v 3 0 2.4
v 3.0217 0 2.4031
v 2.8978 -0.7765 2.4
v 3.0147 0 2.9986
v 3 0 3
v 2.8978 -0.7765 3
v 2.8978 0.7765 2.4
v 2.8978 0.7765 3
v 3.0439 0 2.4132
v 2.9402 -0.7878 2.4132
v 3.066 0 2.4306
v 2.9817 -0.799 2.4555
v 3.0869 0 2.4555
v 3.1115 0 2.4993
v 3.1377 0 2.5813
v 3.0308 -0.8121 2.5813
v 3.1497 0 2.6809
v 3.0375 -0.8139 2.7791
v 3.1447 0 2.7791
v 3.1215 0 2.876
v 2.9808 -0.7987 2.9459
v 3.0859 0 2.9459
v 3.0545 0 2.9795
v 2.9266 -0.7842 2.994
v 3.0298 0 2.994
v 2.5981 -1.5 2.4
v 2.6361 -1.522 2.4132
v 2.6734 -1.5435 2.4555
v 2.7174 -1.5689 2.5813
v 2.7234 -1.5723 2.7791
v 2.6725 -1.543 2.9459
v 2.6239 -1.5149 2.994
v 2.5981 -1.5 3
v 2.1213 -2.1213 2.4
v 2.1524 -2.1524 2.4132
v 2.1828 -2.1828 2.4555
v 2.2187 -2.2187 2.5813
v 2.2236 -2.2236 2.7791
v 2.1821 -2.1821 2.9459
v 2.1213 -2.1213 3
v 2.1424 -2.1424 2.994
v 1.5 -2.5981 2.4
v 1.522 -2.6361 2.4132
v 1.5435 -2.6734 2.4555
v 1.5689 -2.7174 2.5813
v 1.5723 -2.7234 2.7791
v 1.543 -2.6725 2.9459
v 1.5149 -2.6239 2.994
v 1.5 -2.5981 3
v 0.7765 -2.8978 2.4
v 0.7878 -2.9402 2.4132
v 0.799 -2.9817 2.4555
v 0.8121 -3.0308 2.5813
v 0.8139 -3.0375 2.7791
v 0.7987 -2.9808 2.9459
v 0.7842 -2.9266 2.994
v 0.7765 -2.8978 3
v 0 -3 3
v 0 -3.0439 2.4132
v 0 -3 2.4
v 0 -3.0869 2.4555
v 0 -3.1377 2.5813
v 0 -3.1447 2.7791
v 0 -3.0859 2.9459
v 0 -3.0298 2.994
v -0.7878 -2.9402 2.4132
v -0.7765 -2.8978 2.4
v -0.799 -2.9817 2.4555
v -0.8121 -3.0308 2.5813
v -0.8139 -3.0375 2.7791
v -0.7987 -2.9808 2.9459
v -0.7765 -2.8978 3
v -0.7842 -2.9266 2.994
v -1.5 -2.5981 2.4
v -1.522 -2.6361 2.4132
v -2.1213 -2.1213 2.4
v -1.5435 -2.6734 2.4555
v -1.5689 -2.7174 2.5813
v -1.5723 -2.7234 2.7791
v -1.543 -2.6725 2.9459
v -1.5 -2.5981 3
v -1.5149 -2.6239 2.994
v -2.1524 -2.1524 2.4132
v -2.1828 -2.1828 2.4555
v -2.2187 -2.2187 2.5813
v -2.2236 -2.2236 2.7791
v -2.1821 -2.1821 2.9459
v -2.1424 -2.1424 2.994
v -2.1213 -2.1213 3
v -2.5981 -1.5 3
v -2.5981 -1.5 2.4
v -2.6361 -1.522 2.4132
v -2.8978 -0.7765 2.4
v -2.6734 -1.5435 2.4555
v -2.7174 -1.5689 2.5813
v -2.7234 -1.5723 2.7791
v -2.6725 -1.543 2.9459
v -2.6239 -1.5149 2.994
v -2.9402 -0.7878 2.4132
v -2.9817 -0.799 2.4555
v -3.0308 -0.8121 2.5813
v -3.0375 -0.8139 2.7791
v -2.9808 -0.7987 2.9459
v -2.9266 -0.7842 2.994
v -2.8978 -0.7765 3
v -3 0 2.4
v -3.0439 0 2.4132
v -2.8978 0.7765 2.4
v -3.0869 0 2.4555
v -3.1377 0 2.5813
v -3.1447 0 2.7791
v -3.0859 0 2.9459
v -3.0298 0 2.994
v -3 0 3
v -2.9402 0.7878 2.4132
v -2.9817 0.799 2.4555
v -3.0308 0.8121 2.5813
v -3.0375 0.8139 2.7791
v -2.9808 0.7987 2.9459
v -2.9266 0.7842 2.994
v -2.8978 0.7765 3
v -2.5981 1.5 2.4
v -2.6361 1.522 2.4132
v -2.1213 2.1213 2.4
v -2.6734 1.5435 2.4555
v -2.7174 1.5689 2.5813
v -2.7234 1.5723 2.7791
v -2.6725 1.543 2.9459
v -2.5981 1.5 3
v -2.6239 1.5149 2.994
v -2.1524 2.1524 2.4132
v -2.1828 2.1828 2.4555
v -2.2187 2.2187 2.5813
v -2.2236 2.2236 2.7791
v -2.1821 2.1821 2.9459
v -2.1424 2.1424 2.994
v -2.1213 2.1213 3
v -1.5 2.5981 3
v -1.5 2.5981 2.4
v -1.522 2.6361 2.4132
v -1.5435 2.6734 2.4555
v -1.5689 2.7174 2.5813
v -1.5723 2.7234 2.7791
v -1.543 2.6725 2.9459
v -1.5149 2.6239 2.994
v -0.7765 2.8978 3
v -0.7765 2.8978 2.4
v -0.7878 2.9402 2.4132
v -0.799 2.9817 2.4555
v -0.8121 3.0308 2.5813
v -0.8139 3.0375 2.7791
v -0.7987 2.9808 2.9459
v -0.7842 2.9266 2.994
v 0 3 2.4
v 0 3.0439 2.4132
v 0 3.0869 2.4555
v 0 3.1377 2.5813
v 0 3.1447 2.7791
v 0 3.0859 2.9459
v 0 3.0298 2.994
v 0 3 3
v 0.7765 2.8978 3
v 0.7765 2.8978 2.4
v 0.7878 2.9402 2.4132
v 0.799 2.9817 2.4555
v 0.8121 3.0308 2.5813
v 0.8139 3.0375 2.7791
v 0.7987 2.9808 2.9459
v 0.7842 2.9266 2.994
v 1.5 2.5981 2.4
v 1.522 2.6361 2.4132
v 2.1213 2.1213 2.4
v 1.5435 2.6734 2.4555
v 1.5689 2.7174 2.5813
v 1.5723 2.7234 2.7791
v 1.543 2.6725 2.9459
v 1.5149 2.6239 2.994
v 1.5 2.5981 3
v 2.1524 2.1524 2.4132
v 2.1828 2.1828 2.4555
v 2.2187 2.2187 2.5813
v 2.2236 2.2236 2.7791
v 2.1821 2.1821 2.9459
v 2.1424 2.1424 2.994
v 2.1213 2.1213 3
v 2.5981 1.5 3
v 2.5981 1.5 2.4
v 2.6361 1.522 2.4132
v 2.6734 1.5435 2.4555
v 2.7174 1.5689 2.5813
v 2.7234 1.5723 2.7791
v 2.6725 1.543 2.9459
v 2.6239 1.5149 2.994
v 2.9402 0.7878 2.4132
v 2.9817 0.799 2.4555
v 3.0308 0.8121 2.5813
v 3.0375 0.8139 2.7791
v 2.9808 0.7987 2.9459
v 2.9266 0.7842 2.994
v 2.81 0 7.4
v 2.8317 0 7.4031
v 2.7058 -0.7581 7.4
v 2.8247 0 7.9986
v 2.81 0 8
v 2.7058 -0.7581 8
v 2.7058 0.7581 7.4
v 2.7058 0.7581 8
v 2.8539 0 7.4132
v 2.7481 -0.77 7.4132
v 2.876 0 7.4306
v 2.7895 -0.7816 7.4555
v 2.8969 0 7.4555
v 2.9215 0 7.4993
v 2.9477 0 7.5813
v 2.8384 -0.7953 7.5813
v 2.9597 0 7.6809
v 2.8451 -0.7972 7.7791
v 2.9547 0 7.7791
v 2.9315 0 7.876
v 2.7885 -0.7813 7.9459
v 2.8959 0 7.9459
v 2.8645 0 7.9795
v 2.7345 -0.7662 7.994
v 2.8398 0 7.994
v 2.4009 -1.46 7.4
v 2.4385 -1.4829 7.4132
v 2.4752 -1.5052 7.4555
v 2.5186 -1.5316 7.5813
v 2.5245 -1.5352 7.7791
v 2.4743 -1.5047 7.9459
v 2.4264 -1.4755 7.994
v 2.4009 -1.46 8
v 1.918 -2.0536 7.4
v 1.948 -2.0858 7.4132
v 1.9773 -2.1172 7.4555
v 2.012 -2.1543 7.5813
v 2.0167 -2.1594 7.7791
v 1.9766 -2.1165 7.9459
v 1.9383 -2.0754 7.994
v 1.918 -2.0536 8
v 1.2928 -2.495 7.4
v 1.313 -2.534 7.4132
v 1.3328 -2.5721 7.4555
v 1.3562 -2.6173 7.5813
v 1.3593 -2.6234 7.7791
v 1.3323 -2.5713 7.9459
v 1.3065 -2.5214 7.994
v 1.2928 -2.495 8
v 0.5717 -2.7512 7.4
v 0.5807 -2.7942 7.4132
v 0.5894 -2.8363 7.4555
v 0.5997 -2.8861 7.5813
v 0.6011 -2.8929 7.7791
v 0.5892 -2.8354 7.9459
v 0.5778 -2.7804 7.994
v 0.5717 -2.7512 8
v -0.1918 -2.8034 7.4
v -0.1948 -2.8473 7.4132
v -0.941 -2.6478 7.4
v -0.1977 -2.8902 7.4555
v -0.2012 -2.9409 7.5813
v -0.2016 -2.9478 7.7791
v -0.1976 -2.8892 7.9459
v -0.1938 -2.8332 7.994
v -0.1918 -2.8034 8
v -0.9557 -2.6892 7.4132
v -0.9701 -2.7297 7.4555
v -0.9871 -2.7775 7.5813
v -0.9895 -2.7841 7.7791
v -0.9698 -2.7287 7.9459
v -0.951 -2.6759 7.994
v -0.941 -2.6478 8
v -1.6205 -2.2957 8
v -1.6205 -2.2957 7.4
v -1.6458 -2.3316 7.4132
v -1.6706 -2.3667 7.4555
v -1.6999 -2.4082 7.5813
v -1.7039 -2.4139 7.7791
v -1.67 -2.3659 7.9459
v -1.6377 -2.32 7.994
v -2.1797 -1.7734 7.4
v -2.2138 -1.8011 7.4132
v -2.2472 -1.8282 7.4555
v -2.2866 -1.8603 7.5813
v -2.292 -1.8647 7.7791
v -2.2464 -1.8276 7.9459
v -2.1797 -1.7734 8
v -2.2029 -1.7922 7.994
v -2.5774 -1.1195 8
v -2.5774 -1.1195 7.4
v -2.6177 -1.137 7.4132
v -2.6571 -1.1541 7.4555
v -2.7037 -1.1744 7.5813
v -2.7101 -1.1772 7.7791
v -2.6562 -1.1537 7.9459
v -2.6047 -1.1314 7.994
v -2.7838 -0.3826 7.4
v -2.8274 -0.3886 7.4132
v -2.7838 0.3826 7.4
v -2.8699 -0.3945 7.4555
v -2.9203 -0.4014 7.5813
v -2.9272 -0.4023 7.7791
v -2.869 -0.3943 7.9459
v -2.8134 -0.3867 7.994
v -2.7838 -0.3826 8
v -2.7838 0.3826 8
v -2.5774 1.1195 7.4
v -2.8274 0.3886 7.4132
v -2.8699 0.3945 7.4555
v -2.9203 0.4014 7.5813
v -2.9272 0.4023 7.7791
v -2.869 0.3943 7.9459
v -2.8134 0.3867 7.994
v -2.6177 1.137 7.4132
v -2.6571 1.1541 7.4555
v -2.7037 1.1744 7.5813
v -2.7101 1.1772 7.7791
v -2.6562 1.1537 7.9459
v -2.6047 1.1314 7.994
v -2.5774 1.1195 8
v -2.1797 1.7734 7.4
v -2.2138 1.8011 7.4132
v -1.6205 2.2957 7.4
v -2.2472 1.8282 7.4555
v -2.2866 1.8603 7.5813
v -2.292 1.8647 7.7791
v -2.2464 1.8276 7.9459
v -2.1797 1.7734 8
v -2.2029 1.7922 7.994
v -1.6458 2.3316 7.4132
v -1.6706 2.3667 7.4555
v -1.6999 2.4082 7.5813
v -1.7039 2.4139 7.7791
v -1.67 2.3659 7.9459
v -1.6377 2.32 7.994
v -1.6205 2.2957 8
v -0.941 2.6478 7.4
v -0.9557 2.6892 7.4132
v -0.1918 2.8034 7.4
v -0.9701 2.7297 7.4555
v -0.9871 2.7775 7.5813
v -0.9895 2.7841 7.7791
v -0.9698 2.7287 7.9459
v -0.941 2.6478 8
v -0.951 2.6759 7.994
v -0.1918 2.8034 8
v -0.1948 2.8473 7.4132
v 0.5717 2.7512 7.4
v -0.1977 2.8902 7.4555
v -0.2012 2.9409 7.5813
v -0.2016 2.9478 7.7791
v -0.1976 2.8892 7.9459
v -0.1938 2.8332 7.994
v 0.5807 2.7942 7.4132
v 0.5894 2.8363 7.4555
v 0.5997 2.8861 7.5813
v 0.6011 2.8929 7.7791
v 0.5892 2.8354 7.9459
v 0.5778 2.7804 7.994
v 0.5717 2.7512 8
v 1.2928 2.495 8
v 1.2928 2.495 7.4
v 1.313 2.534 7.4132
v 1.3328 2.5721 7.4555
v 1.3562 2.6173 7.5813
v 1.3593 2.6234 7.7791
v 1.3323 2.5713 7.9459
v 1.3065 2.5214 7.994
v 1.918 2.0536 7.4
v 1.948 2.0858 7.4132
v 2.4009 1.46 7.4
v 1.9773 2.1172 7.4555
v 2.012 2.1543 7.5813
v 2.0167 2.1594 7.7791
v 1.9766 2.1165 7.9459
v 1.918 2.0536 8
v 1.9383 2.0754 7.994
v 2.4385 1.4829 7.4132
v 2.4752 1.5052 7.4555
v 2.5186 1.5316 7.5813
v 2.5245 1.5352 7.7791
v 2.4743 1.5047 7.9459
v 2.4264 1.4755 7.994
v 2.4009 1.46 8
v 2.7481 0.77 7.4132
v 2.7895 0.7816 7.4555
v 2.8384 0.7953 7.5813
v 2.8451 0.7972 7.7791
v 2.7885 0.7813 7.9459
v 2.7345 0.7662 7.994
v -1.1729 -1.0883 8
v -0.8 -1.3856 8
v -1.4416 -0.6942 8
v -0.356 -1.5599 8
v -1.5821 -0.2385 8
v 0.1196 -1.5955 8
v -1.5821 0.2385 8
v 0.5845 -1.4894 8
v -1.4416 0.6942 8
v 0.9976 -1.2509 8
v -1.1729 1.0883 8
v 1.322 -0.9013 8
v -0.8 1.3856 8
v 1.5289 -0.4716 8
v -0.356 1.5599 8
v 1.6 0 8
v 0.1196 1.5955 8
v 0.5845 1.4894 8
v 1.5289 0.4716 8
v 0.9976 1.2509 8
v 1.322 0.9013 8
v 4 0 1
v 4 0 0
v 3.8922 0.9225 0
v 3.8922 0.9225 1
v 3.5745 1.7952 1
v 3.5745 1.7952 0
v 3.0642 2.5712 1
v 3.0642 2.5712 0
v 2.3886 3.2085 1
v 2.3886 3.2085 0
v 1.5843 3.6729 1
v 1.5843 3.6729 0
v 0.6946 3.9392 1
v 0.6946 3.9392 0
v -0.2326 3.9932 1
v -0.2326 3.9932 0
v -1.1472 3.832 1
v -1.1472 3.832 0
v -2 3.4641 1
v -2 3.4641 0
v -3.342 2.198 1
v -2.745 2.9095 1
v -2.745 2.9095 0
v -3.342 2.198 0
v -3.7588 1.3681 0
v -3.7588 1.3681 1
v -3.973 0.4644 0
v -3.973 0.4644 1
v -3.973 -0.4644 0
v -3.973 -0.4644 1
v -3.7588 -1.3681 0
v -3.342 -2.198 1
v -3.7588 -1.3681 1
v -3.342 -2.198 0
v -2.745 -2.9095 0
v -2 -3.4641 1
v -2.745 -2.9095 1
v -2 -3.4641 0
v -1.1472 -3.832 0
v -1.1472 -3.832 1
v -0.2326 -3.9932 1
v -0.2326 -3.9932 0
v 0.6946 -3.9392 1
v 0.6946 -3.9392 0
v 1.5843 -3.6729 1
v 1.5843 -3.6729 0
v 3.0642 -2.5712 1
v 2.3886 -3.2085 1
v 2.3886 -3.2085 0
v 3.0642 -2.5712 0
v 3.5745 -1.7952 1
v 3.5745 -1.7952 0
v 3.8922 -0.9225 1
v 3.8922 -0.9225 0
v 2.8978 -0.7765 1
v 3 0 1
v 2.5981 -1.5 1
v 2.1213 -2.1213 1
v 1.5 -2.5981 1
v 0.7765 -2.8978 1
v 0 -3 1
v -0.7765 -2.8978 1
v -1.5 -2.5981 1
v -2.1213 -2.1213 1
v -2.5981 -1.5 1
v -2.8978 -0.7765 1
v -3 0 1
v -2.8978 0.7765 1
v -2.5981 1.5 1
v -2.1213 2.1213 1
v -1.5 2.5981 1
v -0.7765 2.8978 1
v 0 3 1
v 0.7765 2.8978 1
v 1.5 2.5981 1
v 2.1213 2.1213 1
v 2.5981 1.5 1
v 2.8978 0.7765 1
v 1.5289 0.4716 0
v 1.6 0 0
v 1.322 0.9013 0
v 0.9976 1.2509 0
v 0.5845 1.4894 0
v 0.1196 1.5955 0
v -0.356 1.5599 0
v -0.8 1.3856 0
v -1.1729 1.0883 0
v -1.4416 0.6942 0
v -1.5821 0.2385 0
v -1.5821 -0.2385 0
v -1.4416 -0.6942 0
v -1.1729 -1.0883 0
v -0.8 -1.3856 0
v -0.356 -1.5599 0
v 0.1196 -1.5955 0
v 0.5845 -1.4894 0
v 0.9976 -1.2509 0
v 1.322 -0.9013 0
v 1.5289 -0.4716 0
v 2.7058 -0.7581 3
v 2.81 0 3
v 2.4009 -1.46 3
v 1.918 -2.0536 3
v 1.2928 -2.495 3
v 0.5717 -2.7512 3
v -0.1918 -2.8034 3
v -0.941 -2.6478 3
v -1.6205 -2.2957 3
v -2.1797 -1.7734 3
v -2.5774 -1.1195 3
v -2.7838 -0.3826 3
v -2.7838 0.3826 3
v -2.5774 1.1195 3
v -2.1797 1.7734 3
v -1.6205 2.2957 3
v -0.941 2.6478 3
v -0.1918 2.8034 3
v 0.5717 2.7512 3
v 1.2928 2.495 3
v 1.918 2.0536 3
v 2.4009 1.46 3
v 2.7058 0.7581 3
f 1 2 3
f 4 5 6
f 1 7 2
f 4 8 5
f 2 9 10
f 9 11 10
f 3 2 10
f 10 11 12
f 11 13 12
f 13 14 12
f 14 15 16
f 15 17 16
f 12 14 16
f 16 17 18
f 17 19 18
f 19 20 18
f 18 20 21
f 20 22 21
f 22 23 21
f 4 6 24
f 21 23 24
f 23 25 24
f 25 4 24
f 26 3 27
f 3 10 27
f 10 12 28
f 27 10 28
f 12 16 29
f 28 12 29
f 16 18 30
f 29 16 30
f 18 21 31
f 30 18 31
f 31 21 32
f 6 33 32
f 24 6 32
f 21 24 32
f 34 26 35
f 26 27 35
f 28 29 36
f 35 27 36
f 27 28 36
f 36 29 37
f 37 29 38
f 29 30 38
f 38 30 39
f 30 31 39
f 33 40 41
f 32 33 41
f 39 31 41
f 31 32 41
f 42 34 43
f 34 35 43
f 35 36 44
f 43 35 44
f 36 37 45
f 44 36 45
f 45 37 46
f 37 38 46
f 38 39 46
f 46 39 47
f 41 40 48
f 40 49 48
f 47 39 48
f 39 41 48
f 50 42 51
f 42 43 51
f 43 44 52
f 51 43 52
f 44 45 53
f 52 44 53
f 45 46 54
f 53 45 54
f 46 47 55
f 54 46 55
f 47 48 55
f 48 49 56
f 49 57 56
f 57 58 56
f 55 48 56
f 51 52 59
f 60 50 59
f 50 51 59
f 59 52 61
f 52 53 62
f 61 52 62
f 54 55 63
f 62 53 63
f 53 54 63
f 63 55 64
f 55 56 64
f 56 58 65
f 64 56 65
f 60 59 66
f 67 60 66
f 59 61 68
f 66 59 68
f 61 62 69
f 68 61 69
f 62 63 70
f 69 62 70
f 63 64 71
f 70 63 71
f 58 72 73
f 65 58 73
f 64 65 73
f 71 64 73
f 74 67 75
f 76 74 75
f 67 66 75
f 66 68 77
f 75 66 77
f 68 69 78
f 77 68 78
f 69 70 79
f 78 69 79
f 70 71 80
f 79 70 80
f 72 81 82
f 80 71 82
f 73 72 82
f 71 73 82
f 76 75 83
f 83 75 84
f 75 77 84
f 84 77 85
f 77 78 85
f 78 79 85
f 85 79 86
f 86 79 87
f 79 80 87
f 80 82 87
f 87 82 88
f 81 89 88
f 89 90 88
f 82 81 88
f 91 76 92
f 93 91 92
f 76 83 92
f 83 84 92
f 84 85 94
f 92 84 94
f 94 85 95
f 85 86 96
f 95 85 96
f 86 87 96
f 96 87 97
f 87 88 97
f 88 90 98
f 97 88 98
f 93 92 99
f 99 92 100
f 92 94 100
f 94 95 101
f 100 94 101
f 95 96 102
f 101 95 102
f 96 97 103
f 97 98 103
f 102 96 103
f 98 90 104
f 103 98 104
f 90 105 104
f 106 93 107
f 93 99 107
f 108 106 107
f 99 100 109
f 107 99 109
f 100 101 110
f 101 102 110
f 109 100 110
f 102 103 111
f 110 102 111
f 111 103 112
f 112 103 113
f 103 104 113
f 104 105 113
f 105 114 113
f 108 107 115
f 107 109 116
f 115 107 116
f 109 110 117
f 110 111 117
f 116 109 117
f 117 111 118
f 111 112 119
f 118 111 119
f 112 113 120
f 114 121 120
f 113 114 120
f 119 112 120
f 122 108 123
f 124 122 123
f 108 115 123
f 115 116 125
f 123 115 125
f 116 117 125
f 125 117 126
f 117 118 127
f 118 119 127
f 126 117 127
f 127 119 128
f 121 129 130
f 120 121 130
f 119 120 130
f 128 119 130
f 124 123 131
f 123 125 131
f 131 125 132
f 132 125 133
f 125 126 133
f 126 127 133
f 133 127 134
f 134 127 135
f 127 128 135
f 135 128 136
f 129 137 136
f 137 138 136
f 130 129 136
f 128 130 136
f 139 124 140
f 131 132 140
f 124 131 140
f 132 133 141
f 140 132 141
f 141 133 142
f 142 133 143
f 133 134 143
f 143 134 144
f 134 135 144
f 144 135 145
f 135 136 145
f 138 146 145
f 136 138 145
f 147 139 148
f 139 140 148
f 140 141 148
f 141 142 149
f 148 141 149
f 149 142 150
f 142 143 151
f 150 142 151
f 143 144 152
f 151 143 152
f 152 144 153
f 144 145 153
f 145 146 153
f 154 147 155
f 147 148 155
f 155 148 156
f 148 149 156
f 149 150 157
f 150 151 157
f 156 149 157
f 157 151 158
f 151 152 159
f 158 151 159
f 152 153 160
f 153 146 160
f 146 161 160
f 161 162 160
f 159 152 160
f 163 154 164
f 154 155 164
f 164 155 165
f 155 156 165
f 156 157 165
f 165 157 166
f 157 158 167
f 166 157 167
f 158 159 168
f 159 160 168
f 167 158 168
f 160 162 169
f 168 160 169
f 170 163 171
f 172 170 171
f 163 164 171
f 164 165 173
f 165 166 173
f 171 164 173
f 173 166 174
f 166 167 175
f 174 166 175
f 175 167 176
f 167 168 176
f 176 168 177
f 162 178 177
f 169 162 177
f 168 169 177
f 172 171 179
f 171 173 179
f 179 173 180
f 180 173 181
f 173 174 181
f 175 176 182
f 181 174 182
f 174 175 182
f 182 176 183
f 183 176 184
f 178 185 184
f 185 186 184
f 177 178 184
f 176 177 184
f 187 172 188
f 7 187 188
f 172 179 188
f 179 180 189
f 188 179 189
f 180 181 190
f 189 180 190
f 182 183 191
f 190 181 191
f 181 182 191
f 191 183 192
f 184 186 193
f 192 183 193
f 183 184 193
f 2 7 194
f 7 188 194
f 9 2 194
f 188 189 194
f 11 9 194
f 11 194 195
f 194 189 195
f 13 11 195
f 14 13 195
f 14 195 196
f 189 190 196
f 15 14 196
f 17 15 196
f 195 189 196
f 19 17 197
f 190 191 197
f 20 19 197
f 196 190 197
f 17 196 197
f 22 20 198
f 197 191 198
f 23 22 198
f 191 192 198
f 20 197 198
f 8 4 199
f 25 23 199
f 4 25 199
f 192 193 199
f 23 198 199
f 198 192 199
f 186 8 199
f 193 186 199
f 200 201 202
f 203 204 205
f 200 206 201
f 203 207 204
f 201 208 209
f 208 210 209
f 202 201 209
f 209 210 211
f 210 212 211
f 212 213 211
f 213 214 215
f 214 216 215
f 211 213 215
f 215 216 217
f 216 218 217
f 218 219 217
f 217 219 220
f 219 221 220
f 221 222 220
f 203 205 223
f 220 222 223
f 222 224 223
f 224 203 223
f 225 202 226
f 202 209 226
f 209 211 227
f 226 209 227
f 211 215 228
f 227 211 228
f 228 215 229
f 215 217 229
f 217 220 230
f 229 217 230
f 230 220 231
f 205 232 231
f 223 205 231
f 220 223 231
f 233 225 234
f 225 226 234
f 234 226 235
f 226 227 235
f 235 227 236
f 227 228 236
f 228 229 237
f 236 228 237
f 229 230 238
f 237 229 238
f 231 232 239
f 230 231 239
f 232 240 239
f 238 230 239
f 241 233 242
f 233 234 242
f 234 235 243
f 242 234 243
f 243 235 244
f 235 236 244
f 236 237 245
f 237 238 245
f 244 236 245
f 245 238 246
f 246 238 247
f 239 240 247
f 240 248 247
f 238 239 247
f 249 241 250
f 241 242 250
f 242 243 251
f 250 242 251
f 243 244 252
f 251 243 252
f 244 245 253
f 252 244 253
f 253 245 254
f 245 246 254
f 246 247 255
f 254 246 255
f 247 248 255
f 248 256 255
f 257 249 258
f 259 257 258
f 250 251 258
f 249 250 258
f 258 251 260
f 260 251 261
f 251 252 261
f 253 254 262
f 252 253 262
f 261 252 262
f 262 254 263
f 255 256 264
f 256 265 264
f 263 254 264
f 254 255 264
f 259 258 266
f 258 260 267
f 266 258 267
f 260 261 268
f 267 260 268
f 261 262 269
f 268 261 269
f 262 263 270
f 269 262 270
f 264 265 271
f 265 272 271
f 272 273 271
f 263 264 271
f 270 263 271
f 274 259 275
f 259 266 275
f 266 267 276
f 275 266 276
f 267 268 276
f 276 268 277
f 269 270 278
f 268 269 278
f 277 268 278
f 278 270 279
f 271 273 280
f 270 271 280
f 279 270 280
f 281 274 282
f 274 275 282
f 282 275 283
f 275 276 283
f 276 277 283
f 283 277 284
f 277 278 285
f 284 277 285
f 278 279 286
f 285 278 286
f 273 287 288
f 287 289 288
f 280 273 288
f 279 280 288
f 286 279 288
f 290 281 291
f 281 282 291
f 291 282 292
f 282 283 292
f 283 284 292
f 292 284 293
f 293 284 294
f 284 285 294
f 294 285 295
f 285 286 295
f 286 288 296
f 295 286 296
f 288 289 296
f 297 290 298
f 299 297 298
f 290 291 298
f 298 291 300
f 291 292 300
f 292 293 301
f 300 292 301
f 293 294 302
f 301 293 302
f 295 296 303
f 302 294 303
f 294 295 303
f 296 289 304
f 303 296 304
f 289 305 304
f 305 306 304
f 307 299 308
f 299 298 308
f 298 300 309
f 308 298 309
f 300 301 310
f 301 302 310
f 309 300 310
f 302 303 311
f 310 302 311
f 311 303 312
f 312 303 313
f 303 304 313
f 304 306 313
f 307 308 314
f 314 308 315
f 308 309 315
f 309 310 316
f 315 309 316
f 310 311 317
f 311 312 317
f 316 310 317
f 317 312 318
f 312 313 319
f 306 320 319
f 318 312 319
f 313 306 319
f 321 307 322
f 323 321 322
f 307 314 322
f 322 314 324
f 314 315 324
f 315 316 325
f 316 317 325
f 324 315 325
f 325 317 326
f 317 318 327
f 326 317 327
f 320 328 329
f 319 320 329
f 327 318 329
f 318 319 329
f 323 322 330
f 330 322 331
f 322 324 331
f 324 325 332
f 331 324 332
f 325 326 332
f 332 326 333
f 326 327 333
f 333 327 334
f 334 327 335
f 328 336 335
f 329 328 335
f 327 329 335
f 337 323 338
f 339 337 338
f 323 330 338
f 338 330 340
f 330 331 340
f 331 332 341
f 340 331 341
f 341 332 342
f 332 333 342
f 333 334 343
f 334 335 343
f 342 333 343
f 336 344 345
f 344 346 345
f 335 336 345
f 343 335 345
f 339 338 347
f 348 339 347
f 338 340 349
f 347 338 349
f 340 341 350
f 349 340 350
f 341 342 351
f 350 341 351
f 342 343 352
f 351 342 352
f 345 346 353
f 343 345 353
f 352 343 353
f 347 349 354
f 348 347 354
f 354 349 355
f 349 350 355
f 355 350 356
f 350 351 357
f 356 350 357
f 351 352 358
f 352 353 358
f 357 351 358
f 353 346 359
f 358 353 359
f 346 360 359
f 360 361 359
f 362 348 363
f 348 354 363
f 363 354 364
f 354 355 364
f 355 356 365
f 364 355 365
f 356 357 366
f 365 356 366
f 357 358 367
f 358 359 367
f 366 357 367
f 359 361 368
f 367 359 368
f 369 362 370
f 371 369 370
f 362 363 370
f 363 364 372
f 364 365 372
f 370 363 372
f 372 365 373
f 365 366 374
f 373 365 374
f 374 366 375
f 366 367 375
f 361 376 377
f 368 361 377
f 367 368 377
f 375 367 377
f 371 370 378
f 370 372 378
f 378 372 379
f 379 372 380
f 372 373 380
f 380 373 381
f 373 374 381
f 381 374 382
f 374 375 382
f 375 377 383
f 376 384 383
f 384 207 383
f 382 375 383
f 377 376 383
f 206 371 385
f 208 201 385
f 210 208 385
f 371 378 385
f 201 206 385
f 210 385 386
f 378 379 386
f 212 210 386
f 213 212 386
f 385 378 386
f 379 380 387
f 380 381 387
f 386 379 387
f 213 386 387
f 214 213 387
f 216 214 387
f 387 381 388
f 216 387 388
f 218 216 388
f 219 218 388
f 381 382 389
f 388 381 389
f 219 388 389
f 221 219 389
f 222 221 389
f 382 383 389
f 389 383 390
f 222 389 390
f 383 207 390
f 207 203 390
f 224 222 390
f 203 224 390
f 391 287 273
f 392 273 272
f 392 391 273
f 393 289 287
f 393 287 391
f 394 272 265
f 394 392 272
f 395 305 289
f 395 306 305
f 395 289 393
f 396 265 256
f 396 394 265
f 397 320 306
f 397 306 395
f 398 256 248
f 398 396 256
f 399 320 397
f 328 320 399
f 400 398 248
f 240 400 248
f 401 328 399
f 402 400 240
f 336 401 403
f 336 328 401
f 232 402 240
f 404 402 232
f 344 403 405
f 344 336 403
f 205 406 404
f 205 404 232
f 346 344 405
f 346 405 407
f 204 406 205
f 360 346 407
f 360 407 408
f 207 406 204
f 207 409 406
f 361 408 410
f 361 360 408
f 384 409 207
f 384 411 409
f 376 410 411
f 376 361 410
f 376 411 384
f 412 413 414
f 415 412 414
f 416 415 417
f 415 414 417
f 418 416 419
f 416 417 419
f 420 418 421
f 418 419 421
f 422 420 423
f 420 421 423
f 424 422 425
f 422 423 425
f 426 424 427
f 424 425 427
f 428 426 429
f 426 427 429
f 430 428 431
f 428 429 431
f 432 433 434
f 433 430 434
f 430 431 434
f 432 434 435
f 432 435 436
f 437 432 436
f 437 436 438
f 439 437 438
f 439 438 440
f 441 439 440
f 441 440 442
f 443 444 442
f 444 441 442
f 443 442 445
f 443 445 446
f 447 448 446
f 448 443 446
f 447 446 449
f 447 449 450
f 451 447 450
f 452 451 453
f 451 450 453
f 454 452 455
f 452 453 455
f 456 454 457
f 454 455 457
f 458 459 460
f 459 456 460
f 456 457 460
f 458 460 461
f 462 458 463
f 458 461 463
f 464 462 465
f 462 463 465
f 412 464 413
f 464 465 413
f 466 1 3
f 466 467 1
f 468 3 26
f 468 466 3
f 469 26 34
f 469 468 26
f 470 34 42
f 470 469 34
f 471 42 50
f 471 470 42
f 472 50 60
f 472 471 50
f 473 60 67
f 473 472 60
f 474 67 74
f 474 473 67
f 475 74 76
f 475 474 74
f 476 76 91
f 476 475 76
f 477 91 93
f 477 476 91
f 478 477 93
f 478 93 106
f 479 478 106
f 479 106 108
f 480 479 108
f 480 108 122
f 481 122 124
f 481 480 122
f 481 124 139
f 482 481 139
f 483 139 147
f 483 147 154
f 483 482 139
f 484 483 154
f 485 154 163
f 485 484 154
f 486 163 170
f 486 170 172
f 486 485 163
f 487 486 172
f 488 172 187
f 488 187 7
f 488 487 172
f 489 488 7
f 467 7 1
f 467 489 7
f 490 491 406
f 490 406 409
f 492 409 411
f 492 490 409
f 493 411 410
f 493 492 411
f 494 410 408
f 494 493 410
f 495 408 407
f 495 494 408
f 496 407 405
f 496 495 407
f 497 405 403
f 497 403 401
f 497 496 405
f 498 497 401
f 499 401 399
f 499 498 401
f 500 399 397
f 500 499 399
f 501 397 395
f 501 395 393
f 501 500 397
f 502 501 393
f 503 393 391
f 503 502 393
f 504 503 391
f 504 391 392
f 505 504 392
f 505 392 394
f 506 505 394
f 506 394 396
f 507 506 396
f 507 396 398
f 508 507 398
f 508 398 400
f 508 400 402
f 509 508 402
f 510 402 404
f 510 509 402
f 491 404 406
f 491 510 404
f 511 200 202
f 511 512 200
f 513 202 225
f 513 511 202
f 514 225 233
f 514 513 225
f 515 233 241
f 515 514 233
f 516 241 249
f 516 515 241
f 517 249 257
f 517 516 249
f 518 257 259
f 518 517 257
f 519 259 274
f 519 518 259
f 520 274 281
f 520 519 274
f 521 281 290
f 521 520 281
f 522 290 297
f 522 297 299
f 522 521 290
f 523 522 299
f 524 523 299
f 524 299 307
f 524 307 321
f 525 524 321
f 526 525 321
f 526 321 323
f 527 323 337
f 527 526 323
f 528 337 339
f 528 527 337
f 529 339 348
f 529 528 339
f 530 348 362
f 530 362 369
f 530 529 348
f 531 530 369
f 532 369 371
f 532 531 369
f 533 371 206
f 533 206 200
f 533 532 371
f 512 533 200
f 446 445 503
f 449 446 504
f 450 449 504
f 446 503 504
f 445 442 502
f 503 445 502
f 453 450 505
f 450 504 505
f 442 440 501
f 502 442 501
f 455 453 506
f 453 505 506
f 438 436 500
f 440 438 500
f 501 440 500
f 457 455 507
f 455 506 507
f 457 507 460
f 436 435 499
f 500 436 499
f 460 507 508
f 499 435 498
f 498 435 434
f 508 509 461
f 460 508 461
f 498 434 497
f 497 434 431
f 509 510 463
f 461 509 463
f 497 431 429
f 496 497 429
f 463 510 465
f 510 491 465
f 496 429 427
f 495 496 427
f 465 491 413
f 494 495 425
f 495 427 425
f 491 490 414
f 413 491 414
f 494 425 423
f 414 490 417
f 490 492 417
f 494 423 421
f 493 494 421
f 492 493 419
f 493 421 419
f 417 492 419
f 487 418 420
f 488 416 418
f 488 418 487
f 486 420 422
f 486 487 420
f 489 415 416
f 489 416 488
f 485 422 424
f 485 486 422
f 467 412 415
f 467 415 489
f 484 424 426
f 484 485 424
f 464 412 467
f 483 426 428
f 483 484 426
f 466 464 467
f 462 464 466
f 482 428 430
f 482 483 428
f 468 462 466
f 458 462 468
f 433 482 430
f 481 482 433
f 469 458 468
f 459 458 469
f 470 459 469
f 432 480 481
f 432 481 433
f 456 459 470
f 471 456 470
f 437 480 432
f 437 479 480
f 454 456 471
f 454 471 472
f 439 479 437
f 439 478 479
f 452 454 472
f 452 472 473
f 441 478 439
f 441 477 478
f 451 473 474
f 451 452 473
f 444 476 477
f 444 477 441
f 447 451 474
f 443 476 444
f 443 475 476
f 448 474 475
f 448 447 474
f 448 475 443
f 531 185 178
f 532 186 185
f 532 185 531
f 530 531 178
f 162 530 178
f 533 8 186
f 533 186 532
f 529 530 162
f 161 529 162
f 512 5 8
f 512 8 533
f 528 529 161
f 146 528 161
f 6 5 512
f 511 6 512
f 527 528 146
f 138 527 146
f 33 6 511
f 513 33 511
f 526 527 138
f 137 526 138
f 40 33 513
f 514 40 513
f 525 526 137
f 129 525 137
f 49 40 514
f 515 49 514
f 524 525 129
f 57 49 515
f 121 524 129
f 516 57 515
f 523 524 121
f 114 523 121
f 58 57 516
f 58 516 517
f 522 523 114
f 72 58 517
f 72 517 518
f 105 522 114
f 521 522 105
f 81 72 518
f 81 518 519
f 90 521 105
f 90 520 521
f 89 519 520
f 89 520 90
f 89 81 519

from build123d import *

# Parameters (mm, degrees)
SKETCH1_R           = 4
SKETCH1_R_2         = 1.6
BOSS_EXTRUDE1_DEPTH = 8


with BuildPart() as part:
    # Sketch1 → Boss-Extrude1 (new body)
    with BuildSketch(Plane.XY):
        Circle(SKETCH1_R)
        Circle(SKETCH1_R_2, mode=Mode.SUBTRACT)
    extrude(amount=BOSS_EXTRUDE1_DEPTH)

    # Sketch2 → Cut-Revolve1 (revolve, cut)
    with BuildSketch(Plane(origin=(0, 0, 0), x_dir=(0, 0, -1), z_dir=(1, 0, 0)), mode=Mode.PRIVATE) as cut_revolve1_sk:
        with BuildLine():
            Line((-2.4, 3), (-1, 3))
            Line((-1, 3), (-1, 4))
            Line((-1, 4), (-8, 4))
            Line((-8, 4), (-8, 2.81))
            add(Edge.make_bspline(
                [(-7.4, 2.81), (-7.4, 2.96), (-7.7, 2.96), (-8, 2.96), (-8, 2.81)],
                knots=[0, 0, 0, 1.570796327, 1.570796327, 3.141592654, 3.141592654, 3.141592654], degree=2, weights=[1, 0.707106781, 1, 0.707106781, 1]))
            Line((-7.4, 2.81), (-3, 2.81))
            Line((-3, 2.81), (-3, 3))
            add(Edge.make_bspline(
                [(-2.4, 3), (-2.4, 3.15), (-2.7, 3.15), (-3, 3.15), (-3, 3)],
                knots=[0, 0, 0, 1.570796327, 1.570796327, 3.141592654, 3.141592654, 3.141592654], degree=2, weights=[1, 0.707106781, 1, 0.707106781, 1]))
        make_face()
    revolve(cut_revolve1_sk.sketch.rotate(Axis((0, 0, 8), (0, 0, -1)), 90), axis=Axis((0, 0, 8), (0, 0, -1)), mode=Mode.SUBTRACT)


solid = part.part
